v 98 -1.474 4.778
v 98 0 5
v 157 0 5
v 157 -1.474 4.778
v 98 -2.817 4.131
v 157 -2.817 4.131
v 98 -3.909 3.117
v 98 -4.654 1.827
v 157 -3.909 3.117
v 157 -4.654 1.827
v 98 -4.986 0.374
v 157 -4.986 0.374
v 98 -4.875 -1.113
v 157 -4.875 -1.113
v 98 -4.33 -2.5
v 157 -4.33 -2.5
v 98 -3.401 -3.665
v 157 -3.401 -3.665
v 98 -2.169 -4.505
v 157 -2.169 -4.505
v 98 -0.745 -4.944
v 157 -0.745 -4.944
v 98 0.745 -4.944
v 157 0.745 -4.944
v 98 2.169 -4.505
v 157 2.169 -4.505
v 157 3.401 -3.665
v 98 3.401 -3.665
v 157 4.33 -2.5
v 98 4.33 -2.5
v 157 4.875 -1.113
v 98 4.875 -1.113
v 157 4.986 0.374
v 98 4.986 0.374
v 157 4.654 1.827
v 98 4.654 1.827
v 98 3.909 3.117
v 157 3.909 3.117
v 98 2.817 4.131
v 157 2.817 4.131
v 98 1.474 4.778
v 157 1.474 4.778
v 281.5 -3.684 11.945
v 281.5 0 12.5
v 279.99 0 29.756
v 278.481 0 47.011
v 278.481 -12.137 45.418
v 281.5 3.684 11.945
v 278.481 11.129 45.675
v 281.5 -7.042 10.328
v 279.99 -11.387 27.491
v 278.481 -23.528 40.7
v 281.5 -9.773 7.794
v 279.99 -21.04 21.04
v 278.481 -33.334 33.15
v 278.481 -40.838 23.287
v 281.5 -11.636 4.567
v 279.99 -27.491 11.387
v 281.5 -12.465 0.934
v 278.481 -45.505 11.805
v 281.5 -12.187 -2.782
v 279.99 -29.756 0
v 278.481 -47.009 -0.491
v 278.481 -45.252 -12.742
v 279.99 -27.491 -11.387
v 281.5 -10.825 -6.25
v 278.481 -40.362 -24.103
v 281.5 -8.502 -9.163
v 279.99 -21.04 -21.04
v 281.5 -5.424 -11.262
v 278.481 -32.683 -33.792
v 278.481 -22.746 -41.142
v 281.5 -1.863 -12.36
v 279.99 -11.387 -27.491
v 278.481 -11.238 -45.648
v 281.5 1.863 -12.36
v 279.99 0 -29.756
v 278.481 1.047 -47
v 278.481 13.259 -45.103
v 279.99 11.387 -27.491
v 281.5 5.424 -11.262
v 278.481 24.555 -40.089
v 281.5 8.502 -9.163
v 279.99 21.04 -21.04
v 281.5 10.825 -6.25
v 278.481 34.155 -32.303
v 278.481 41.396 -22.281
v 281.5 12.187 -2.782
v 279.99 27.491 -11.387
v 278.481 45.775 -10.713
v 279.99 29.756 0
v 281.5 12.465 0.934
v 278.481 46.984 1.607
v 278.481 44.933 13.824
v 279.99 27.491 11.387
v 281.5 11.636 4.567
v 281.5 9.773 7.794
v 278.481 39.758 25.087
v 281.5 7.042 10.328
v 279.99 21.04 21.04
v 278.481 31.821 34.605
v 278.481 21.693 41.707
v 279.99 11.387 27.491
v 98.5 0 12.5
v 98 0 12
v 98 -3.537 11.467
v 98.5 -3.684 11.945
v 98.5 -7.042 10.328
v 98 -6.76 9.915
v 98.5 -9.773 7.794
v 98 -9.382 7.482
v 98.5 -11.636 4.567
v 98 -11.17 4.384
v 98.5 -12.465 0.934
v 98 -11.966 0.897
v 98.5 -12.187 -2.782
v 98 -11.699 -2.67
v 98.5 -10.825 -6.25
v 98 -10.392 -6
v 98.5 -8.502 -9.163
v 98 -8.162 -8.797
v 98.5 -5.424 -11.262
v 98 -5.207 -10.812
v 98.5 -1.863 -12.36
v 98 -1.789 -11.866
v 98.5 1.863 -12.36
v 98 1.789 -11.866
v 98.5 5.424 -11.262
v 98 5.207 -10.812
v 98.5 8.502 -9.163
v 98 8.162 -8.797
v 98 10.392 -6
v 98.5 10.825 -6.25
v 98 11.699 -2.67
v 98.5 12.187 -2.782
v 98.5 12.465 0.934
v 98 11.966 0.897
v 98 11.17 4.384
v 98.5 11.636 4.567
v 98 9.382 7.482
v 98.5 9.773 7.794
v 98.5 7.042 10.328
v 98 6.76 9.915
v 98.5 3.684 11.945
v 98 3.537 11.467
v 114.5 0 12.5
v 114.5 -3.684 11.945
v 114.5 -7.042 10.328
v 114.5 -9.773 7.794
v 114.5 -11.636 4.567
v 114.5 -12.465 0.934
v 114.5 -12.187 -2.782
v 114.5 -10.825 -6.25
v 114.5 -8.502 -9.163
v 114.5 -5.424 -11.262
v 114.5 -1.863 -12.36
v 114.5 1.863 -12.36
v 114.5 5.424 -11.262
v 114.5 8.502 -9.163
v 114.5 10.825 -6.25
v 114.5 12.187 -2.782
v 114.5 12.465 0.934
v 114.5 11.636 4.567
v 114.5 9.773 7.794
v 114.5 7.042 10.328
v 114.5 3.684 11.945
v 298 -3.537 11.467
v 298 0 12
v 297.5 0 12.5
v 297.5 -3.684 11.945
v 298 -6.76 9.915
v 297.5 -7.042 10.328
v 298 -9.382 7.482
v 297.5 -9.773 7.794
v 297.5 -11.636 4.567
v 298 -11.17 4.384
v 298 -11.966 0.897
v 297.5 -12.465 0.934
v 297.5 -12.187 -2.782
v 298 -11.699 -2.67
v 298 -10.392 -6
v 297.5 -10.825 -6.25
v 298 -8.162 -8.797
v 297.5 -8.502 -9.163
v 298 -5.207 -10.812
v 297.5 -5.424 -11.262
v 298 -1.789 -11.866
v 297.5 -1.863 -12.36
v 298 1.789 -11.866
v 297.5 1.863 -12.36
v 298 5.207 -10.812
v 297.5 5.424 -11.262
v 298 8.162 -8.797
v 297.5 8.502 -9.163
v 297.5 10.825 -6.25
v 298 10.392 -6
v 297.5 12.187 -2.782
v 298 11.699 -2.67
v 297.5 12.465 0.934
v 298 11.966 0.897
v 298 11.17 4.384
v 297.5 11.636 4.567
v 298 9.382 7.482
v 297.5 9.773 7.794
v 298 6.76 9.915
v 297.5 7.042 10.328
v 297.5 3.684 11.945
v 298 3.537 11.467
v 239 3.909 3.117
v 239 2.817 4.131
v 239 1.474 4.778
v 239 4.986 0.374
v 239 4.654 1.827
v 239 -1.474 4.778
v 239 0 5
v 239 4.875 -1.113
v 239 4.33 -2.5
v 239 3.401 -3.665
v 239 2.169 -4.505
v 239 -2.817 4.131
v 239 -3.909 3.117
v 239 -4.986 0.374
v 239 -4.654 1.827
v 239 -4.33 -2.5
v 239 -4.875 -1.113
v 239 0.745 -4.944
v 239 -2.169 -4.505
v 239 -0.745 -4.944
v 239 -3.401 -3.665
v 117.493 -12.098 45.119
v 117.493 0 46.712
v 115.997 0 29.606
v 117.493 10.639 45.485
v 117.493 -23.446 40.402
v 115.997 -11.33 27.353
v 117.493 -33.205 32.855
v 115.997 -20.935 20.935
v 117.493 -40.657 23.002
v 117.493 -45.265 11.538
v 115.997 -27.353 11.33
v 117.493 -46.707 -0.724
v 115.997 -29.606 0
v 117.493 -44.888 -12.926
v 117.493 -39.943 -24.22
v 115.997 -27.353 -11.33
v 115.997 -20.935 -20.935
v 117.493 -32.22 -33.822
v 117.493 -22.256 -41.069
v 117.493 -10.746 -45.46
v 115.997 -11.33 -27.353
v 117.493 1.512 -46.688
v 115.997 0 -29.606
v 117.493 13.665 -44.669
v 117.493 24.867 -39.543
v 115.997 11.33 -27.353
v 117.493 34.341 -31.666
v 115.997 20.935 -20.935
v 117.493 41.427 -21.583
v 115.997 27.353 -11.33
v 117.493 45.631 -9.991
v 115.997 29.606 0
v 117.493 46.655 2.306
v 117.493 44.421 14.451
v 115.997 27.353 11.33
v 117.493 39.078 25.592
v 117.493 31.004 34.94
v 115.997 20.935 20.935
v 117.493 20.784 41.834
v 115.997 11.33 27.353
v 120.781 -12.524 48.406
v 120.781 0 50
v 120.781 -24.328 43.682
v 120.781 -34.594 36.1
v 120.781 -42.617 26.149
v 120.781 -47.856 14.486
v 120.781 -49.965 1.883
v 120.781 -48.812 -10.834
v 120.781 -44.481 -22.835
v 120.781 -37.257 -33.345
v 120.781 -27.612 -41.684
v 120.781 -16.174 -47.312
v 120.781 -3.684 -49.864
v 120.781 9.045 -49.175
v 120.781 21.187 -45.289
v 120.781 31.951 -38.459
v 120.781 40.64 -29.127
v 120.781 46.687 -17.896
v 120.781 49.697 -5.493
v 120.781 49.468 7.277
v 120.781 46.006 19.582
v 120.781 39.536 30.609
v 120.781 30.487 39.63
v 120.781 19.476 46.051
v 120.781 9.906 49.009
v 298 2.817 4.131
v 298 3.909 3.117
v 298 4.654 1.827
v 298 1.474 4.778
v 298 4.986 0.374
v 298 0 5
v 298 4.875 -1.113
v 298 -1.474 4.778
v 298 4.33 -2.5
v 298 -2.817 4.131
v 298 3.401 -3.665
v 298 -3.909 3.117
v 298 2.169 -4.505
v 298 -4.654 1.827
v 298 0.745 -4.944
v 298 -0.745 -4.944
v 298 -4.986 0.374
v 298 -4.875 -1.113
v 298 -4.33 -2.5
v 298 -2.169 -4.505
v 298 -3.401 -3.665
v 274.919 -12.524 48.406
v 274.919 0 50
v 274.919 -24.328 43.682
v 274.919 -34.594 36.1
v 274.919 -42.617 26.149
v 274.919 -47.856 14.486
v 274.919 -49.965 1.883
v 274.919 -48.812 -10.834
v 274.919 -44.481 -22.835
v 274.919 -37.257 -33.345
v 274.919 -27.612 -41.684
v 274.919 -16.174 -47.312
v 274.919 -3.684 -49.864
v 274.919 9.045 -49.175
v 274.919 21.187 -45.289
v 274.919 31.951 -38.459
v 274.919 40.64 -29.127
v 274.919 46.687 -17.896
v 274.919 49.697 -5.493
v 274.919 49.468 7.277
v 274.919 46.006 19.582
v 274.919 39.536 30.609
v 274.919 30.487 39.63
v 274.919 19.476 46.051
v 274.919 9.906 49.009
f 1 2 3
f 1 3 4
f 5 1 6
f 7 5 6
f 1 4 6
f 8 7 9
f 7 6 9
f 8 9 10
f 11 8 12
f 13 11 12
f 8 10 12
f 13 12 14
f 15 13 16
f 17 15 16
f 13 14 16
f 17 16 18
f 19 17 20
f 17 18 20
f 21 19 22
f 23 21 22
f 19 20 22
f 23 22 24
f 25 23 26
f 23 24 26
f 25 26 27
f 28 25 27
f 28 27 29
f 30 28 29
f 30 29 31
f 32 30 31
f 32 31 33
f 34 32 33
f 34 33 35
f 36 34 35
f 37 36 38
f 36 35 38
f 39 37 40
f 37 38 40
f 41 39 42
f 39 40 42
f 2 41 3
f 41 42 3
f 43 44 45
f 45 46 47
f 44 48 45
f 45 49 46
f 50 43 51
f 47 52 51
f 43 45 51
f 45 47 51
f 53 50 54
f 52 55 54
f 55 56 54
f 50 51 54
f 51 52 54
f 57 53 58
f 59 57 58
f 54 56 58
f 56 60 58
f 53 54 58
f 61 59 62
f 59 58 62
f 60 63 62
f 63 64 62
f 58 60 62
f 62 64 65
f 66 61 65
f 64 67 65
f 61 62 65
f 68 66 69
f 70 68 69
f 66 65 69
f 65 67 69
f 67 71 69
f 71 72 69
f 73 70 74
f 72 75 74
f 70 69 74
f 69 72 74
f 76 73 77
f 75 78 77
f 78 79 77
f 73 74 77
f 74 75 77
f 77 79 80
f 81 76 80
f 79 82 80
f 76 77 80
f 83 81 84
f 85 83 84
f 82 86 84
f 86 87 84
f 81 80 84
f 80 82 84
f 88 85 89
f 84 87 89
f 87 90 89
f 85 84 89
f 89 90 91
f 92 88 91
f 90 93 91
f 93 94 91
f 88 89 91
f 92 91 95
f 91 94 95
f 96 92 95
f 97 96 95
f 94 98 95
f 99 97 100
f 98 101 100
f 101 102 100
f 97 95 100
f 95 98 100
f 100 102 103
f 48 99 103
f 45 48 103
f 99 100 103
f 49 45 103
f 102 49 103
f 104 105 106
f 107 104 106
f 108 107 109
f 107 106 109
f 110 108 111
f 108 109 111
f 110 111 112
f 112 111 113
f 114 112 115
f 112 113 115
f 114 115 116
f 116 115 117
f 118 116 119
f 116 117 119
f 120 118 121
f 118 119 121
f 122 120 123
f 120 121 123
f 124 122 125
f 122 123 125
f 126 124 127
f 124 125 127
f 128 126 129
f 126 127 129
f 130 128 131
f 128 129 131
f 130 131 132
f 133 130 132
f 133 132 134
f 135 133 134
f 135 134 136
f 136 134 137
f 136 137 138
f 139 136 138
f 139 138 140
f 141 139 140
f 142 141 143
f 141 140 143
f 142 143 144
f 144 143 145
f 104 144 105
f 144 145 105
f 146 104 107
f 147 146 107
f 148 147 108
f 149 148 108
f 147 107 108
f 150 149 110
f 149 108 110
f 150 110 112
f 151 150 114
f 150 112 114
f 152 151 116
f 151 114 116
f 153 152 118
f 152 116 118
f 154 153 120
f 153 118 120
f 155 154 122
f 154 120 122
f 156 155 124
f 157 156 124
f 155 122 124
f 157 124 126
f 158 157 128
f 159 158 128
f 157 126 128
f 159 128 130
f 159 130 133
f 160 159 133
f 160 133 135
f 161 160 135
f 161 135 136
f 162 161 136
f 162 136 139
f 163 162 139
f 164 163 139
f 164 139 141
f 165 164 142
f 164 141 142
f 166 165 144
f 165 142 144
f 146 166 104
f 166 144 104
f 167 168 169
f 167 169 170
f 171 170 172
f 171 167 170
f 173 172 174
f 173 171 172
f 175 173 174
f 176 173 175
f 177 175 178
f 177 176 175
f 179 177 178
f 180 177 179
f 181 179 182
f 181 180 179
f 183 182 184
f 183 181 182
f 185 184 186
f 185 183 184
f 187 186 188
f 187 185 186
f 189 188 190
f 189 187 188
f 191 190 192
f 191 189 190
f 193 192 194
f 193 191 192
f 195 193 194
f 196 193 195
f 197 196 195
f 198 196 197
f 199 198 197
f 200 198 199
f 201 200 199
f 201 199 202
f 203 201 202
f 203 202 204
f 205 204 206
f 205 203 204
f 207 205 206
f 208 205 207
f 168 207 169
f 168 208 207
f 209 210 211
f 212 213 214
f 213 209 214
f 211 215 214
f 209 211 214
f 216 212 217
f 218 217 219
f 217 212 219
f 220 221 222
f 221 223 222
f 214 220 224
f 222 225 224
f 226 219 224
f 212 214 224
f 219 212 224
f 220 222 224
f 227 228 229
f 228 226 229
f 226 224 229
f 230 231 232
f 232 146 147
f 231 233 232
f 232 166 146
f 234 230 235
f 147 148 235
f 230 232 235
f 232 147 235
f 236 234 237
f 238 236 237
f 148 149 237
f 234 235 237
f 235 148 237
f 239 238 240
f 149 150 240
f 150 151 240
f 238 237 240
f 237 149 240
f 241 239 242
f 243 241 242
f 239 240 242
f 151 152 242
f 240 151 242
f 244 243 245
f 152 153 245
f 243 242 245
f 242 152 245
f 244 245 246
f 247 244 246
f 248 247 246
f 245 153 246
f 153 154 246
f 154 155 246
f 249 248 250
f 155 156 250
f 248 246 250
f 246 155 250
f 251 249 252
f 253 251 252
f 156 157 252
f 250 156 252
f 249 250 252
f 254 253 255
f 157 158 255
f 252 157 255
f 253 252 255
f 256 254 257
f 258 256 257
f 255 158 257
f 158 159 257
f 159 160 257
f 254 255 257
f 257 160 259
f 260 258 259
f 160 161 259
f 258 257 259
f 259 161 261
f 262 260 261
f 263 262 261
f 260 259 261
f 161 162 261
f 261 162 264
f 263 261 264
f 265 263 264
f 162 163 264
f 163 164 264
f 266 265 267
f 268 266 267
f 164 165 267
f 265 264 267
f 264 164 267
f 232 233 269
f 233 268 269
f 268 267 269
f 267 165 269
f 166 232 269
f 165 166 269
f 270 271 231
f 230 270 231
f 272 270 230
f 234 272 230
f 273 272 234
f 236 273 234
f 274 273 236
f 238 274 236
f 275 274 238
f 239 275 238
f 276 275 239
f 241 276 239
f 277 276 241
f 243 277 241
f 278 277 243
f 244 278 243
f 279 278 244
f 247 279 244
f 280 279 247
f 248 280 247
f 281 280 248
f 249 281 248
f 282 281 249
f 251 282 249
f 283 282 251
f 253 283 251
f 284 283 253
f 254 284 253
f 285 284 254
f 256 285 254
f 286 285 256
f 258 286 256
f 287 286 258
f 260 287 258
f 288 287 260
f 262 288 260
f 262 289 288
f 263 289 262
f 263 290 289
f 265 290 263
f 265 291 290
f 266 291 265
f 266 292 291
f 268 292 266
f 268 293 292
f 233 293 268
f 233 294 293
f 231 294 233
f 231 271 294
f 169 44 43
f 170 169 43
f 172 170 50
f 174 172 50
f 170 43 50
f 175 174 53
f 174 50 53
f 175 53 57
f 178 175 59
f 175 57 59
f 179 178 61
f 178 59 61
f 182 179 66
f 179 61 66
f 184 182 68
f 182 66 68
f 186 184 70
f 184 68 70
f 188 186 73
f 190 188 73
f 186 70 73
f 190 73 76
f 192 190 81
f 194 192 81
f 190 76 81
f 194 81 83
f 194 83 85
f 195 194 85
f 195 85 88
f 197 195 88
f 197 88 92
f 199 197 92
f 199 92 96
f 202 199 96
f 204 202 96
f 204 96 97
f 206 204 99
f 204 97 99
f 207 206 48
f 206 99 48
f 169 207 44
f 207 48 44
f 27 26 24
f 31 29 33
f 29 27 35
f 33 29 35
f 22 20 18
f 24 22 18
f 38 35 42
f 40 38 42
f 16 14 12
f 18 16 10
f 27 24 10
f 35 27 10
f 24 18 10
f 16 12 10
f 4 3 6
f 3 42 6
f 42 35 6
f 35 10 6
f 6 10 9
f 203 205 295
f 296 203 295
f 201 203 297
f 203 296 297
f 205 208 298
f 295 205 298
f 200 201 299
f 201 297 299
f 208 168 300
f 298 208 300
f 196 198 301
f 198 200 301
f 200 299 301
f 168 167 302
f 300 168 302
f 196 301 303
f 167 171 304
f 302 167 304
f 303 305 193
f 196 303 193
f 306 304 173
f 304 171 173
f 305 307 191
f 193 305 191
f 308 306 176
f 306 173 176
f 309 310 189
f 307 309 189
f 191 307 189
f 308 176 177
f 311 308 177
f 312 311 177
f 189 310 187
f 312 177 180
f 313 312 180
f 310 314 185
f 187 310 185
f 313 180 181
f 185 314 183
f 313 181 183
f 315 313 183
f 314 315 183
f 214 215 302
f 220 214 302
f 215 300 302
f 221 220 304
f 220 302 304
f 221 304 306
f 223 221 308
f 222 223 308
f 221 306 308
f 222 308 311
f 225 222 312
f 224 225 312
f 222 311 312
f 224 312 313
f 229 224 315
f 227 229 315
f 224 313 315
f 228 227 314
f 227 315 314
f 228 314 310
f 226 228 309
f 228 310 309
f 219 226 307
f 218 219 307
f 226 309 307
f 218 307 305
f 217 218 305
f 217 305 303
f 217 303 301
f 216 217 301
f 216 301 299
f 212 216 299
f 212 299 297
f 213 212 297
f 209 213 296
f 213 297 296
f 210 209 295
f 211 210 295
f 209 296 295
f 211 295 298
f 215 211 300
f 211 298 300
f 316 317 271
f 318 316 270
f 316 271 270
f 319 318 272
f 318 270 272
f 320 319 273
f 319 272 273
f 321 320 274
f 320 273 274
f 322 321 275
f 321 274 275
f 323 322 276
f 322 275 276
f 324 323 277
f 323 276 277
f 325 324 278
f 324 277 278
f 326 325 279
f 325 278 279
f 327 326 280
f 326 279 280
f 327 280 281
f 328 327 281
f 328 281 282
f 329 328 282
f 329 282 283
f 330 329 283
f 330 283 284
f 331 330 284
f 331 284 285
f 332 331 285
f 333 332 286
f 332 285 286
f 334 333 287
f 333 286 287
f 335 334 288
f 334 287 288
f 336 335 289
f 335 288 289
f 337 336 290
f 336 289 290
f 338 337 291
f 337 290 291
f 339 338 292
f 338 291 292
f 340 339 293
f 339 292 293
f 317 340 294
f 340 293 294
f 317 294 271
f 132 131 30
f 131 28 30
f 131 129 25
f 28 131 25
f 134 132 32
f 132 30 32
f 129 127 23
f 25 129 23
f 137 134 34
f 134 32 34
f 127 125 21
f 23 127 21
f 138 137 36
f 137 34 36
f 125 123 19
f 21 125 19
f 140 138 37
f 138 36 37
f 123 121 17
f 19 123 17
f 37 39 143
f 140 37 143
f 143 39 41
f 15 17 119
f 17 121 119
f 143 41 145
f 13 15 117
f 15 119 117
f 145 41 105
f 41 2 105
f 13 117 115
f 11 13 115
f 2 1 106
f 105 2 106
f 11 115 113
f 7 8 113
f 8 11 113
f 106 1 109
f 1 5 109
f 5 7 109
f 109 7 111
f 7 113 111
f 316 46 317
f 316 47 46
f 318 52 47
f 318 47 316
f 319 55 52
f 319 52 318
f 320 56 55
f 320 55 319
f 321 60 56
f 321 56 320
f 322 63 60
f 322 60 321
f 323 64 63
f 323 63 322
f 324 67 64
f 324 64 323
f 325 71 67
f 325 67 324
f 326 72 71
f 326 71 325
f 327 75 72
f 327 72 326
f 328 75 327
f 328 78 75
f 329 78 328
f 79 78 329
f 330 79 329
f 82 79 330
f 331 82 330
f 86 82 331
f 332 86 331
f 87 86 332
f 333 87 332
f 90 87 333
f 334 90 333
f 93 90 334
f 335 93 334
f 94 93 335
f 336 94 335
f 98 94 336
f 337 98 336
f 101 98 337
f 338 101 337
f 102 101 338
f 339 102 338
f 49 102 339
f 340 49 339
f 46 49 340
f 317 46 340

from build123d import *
from OCP.BRepFilletAPI import BRepFilletAPI_MakeChamfer

# Parameters (mm, degrees)
CHAFL_N1_SIZE  = 3
CHAFL_N1_SIZE2 = 3.300188603
CHAFL_N2_SIZE  = 0.5


with BuildPart() as part:
    # Croquis1 → Revolución1 (revolve)
    with BuildSketch(Plane.XY, mode=Mode.PRIVATE) as revoluci_n1_sk:
        Polygon((114.5, 12.5), (98, 12.5), (98, 5), (157, 5), (157, 0), (239, 0), (239, 5), (298, 5), (298, 12.5), (281.5, 12.5), (278.219175118, 50), (117.780824882, 50), align=None)
    revolve(revoluci_n1_sk.sketch.rotate(Axis((26.636942393, 0, 0), (1, 0, 0)), 90), axis=Axis((26.636942393, 0, 0), (1, 0, 0)))

    # Chaflán1: one chamfer whose edges measure the first distance from different faces: ONE call of the kernel's chamfer builder (chamfer() names one face for all edges)
    chafl_n1_edges_1 = [part.edges().sort_by_distance(p)[0] for p in [
        (117.780824882, 0, -50),
    ]]
    chafl_n1_side_1 = [part.faces().sort_by_distance(p)[0] for p in [
        (198, 0, -50),
    ]]
    chafl_n1_edges_2 = [part.edges().sort_by_distance(p)[0] for p in [
        (278.219175118, 0, -50),
    ]]
    chafl_n1_side_2 = [part.faces().sort_by_distance(p)[0] for p in [
        (279.859587559, 0, -31.25),
    ]]
    chafl_n1 = BRepFilletAPI_MakeChamfer(part.part.solid().wrapped)
    for e in chafl_n1_edges_1:
        chafl_n1.Add(CHAFL_N1_SIZE, CHAFL_N1_SIZE2, e.wrapped, chafl_n1_side_1[0].wrapped)  # the first distance lies on this face
    for e in chafl_n1_edges_2:
        chafl_n1.Add(CHAFL_N1_SIZE, CHAFL_N1_SIZE2, e.wrapped, chafl_n1_side_2[0].wrapped)  # the first distance lies on this face
    add(Compound.cast(chafl_n1.Shape()), mode=Mode.REPLACE)

    # Chaflán2
    chafl_n2_edges = [part.edges().sort_by_distance(p)[0] for p in [
        (298, 0, -12.5),
        (98, 0, -12.5),
    ]]
    chamfer(chafl_n2_edges, length=CHAFL_N2_SIZE)


solid = part.part
